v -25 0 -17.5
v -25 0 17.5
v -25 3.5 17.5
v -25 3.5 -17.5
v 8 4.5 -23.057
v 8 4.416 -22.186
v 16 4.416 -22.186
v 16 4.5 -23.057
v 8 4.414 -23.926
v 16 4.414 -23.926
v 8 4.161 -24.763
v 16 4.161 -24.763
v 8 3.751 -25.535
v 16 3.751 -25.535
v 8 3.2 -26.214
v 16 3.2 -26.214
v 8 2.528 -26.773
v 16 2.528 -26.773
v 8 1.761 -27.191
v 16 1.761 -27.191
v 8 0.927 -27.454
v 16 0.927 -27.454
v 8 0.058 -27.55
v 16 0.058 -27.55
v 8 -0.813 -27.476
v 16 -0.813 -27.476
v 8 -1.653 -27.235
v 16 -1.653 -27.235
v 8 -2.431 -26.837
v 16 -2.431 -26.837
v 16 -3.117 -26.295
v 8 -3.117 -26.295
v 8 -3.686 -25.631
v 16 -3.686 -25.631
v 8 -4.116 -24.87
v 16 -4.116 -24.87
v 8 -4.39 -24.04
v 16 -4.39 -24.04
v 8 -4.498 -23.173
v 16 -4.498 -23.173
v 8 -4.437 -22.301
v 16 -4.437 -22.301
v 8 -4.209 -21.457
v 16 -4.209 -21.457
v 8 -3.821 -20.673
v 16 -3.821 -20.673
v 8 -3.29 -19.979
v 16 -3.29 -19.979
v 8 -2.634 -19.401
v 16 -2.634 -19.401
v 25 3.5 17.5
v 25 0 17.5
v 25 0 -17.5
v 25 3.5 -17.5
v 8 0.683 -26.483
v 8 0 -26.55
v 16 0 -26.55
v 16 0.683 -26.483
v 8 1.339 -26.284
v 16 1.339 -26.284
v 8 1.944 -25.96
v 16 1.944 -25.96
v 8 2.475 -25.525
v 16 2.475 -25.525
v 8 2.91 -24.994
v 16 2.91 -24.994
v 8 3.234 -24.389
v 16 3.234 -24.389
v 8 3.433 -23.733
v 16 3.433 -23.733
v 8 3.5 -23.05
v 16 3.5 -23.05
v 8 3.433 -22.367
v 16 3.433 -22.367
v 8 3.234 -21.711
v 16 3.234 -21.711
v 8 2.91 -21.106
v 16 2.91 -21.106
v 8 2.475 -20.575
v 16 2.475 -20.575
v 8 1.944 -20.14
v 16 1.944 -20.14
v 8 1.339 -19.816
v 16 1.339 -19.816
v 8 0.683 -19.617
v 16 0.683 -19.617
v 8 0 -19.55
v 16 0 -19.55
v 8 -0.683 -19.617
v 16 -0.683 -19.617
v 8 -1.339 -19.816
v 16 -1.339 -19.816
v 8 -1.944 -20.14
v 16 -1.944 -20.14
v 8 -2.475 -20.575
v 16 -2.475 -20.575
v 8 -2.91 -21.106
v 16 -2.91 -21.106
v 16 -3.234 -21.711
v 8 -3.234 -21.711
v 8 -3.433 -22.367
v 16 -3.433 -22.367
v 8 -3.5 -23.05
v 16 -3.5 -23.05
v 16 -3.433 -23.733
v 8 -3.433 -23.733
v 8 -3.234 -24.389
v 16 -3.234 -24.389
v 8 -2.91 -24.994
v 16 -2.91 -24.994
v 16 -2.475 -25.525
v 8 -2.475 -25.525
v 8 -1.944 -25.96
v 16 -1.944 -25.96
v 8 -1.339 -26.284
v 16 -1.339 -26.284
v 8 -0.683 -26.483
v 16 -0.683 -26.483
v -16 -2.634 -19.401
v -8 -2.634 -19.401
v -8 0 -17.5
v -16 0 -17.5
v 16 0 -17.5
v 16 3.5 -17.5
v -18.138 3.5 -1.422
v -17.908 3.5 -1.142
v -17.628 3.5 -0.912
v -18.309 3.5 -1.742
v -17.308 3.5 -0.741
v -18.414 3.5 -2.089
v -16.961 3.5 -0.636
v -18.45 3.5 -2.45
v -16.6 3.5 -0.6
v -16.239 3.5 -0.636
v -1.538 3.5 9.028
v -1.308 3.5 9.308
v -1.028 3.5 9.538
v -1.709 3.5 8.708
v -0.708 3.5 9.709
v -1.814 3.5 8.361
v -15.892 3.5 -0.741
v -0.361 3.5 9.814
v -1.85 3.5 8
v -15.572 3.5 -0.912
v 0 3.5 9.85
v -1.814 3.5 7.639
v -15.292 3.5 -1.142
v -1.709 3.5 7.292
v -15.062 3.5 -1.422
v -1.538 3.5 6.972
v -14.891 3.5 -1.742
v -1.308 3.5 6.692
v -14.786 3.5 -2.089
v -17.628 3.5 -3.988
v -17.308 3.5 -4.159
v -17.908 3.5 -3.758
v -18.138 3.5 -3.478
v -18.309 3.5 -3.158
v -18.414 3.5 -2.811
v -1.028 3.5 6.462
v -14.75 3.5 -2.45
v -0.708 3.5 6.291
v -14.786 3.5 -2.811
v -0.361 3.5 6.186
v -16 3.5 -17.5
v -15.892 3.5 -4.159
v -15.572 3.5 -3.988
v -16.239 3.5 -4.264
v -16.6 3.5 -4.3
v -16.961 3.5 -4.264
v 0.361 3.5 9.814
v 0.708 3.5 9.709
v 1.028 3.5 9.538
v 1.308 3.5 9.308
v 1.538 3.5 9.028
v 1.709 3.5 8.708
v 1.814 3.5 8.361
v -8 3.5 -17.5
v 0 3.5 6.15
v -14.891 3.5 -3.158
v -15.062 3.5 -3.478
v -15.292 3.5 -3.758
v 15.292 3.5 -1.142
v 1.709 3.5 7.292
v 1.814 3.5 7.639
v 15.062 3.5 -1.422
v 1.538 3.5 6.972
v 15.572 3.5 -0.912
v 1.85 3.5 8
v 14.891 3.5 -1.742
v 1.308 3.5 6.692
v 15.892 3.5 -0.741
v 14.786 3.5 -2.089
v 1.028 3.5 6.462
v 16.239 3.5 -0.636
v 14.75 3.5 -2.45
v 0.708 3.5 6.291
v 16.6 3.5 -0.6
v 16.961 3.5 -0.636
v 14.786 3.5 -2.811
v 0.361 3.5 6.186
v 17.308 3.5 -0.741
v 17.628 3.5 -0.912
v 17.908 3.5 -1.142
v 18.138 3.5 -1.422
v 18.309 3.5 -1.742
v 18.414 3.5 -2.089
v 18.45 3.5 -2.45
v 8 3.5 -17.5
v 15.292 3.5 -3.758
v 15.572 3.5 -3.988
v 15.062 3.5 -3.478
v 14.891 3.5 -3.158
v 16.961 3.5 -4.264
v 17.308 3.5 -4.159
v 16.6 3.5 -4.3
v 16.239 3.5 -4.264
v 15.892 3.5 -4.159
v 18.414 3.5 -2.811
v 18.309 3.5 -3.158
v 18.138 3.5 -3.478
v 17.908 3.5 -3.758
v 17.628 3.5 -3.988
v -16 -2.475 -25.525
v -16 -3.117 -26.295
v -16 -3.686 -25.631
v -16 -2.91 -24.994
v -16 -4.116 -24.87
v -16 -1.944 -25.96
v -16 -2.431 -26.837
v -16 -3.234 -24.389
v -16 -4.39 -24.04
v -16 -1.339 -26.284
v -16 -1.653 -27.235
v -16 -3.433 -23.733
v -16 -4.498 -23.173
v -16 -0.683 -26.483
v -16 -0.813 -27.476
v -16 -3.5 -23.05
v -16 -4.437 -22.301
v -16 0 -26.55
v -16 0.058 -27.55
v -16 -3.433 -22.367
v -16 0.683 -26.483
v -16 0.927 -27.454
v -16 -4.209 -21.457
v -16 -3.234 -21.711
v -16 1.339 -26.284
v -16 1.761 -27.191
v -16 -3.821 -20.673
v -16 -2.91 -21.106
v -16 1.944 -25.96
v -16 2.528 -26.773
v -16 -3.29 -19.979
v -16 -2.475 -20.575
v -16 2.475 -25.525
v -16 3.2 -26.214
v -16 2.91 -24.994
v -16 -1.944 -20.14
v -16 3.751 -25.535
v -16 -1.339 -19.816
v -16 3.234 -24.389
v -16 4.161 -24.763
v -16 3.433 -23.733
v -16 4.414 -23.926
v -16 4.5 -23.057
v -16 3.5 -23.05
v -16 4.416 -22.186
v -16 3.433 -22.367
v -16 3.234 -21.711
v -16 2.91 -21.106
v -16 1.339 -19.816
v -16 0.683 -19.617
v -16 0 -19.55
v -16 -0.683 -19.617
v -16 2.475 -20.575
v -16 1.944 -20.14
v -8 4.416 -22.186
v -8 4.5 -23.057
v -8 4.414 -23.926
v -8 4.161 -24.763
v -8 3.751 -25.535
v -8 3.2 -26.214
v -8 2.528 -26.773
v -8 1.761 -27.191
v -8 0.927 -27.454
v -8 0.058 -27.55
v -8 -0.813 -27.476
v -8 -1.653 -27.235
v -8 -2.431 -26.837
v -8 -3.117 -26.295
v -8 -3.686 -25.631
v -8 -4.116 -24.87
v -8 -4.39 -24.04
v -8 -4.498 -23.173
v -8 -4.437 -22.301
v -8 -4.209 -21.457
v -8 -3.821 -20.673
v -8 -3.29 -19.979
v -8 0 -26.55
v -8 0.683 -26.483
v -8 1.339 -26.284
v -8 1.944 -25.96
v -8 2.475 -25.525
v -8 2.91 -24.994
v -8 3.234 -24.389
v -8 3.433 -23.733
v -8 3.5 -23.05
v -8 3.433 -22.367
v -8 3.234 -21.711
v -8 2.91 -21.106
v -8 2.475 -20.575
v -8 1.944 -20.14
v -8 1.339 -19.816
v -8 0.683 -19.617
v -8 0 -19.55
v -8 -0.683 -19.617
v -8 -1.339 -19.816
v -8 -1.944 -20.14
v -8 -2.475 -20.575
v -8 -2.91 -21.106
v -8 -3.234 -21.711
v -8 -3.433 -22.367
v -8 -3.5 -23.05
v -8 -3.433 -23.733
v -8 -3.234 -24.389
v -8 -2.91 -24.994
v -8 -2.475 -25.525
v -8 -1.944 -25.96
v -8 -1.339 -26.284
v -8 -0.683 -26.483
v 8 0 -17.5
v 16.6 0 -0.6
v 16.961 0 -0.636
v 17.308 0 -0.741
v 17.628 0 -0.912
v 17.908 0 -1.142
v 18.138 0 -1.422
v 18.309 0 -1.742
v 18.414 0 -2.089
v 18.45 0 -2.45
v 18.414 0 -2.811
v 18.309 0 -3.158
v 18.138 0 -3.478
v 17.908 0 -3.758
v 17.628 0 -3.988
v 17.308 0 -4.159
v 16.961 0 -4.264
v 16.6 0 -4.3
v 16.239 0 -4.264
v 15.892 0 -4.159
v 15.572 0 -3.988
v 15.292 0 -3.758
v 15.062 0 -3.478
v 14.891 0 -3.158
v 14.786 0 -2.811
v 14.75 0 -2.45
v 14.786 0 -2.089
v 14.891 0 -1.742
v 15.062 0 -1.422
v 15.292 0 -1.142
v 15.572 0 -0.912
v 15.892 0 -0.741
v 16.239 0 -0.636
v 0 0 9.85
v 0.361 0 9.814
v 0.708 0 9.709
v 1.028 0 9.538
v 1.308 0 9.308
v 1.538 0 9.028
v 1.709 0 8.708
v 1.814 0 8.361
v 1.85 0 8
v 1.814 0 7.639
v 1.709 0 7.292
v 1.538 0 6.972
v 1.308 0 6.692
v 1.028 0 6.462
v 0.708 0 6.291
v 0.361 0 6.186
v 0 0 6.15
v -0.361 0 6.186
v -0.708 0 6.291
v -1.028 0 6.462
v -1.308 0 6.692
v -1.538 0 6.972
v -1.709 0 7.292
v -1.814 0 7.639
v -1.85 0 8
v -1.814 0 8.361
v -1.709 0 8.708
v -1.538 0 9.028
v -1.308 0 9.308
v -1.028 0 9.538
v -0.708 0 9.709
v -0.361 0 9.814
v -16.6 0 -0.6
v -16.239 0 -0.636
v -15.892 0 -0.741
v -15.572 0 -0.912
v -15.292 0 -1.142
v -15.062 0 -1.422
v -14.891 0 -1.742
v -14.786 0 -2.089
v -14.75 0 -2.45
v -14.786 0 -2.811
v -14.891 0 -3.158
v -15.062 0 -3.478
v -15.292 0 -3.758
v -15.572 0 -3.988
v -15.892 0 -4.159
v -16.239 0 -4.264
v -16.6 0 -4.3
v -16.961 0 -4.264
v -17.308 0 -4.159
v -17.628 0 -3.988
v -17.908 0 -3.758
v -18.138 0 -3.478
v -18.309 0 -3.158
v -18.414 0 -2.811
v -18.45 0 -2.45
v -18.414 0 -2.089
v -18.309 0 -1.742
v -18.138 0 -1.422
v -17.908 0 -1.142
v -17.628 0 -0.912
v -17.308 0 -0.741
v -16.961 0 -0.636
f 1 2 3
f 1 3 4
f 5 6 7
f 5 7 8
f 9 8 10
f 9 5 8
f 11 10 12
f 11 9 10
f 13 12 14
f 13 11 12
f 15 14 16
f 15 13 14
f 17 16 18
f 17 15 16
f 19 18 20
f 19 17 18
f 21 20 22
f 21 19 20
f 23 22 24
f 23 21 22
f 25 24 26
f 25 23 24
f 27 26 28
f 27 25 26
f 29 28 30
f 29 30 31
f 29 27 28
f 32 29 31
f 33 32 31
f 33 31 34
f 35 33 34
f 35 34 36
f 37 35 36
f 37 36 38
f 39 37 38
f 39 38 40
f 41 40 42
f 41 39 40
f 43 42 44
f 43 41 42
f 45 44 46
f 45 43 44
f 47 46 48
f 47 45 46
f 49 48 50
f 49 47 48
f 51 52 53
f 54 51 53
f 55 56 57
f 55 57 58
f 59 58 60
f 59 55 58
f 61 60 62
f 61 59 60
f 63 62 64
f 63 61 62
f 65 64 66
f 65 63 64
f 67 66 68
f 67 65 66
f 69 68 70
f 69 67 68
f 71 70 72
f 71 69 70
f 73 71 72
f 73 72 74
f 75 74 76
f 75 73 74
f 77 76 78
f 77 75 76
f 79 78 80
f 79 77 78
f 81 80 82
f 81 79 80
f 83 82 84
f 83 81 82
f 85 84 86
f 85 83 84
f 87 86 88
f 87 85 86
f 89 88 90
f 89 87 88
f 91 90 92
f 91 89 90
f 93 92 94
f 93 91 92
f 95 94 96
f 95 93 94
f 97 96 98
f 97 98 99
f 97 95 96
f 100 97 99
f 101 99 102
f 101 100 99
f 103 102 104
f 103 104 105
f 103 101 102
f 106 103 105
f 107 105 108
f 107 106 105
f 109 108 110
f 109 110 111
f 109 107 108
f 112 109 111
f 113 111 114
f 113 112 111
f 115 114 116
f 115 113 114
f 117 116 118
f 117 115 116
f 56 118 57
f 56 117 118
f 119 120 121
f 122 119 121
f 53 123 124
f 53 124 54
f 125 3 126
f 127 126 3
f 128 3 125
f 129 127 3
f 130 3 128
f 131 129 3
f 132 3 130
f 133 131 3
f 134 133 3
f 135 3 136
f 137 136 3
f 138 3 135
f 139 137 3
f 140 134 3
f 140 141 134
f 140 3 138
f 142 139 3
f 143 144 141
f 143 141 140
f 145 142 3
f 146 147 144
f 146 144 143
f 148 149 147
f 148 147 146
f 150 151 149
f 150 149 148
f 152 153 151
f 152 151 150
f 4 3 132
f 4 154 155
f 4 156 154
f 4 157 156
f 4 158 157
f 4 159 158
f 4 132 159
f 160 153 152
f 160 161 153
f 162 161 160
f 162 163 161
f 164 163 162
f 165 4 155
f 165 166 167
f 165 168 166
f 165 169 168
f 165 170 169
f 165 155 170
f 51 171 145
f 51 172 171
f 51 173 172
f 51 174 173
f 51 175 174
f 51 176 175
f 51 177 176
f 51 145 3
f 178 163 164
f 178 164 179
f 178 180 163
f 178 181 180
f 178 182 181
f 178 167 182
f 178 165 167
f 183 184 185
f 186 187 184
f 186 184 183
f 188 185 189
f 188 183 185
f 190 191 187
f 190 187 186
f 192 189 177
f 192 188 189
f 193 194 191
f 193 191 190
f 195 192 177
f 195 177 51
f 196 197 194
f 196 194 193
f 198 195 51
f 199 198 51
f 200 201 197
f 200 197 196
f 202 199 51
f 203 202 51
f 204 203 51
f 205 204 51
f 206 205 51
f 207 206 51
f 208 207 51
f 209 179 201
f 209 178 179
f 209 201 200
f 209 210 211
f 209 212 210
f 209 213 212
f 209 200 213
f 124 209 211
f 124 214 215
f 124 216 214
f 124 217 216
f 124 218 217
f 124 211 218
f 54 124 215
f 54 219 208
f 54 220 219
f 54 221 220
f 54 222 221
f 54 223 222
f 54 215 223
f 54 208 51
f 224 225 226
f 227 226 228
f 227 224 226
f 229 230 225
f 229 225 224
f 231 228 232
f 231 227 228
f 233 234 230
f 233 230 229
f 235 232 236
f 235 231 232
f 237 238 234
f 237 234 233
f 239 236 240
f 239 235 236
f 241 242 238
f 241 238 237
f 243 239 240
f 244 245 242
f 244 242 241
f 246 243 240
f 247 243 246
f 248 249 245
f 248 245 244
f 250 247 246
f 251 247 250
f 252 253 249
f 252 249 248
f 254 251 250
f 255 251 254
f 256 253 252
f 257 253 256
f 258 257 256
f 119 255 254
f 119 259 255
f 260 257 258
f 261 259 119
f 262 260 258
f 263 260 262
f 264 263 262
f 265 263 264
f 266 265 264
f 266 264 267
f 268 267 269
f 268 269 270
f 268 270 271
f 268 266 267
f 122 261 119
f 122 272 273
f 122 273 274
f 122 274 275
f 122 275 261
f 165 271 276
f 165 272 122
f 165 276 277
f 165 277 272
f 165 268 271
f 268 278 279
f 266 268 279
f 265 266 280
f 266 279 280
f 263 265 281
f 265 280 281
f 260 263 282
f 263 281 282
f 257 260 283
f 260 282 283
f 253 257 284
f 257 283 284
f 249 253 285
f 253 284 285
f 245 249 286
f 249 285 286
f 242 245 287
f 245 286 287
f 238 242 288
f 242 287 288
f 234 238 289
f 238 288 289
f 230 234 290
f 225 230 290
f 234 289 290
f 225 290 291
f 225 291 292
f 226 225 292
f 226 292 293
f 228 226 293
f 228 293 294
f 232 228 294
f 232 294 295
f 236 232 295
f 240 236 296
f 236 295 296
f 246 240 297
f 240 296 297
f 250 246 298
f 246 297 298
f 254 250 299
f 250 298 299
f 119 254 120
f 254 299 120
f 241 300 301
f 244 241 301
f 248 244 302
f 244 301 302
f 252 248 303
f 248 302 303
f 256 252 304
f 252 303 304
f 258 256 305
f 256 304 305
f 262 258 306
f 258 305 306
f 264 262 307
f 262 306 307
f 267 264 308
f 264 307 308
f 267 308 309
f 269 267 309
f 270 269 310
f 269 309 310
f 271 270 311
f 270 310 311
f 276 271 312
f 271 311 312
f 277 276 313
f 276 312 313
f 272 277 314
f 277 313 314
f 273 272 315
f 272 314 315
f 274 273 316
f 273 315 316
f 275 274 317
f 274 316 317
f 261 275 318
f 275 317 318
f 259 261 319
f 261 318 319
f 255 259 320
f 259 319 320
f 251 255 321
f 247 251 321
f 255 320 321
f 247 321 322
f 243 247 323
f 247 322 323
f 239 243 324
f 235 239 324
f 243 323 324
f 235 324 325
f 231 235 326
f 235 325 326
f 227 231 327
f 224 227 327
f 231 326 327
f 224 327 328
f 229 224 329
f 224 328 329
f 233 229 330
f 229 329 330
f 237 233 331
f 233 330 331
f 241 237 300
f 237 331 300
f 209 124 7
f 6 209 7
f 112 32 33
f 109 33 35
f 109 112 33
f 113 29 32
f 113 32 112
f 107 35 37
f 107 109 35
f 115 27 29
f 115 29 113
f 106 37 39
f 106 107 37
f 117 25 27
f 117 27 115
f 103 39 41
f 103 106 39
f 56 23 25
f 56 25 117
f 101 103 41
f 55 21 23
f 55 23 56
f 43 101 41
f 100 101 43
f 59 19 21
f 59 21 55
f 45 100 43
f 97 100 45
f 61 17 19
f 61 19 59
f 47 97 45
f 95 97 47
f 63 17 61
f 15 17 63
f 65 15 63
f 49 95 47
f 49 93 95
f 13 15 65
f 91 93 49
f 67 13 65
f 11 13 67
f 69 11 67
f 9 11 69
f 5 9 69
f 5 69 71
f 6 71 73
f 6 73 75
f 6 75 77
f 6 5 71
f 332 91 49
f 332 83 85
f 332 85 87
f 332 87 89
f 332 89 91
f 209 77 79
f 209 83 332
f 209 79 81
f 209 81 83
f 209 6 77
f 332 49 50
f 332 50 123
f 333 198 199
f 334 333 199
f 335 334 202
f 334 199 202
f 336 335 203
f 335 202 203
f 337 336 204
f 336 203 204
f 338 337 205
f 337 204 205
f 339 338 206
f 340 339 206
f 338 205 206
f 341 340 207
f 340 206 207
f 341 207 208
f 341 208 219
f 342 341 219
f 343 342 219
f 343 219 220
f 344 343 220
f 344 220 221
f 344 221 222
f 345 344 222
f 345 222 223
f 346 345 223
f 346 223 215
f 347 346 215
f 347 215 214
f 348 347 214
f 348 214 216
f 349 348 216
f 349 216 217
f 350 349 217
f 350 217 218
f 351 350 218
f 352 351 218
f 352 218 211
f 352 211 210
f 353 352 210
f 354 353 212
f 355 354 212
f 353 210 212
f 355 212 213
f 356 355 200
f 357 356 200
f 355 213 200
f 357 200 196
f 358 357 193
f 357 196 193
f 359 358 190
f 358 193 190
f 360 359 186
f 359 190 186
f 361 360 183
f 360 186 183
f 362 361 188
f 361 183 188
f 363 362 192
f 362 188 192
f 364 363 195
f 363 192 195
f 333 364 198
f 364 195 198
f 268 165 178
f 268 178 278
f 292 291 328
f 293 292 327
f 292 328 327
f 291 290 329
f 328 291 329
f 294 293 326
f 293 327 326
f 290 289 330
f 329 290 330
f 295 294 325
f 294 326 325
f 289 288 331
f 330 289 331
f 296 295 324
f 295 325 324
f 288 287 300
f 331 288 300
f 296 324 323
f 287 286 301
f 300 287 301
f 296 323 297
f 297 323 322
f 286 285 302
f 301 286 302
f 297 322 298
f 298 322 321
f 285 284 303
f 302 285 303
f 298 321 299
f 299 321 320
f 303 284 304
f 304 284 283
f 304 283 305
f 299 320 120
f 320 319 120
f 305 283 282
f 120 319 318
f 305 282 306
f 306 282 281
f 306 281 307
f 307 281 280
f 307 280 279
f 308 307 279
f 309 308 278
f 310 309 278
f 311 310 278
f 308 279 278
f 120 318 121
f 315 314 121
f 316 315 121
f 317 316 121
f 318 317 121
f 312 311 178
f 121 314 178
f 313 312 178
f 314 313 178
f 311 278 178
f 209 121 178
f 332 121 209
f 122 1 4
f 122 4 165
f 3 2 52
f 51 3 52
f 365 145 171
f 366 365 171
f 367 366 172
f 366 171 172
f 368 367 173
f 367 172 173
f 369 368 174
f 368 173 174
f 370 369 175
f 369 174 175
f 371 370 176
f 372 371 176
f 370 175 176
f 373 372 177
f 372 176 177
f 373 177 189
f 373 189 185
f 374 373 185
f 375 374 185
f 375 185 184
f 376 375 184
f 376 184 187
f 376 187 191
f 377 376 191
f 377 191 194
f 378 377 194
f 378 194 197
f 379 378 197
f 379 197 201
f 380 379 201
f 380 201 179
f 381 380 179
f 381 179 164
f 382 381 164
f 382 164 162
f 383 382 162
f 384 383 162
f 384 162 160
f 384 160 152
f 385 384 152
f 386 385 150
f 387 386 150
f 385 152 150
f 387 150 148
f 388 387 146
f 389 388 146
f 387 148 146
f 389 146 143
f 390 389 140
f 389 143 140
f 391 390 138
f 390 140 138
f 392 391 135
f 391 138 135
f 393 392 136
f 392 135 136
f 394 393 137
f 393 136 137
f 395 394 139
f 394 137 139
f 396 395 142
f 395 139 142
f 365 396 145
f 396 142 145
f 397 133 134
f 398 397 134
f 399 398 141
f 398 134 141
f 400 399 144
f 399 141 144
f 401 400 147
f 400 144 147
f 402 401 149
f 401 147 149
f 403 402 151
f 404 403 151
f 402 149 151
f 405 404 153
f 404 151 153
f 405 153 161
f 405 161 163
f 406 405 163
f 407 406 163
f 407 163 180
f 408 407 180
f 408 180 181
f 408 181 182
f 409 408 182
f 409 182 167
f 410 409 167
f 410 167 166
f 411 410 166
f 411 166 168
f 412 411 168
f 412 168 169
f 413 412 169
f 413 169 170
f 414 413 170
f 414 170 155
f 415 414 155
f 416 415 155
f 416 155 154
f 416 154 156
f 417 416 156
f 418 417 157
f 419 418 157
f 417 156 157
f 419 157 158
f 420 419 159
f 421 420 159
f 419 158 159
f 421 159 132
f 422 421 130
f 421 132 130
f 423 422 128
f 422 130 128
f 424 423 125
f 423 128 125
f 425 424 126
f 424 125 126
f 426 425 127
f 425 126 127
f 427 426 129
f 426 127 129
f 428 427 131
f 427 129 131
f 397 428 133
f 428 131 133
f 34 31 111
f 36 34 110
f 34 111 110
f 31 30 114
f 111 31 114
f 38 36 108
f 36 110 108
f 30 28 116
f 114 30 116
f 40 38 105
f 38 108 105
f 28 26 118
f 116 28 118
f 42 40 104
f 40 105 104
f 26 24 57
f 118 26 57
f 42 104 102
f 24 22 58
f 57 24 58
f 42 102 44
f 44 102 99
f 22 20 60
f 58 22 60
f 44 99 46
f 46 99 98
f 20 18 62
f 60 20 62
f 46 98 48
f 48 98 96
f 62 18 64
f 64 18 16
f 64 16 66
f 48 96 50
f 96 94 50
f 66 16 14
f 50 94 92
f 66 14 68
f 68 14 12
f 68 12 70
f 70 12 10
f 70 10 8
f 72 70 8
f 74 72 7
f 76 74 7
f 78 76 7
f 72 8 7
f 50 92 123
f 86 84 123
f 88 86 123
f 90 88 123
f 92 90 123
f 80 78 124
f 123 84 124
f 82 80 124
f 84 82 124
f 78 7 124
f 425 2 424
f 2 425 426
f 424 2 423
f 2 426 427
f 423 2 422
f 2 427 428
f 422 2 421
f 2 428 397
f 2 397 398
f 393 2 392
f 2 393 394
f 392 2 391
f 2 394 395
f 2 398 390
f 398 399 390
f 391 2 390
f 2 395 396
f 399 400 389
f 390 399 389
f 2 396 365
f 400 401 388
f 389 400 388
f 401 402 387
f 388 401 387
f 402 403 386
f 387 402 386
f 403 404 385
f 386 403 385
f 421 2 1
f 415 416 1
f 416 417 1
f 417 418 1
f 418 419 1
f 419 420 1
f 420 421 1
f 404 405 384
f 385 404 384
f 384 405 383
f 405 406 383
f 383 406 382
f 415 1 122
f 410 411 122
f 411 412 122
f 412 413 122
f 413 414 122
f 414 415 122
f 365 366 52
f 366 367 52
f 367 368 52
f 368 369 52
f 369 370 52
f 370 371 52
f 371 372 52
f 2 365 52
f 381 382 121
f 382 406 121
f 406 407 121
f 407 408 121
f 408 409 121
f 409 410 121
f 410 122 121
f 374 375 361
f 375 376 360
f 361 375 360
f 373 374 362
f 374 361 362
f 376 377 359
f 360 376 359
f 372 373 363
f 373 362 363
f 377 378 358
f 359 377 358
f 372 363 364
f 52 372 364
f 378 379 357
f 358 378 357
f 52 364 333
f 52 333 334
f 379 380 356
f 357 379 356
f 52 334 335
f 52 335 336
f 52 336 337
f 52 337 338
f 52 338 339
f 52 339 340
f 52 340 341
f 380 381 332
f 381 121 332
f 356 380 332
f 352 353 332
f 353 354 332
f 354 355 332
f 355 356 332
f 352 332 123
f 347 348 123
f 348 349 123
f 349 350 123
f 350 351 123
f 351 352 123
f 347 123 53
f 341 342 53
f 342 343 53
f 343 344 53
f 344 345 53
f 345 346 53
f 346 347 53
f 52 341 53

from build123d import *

# Parameters (mm, degrees)
SKETCH2_W           = 50
SKETCH2_H           = 35
BOSS_EXTRUDE1_DEPTH = 3.5
SKETCH3_R           = 1.85
CUT_EXTRUDE1_DEPTH  = 31.716445107
SKETCH5_R           = 3.5
BOSS_EXTRUDE2_DEPTH = 8


with BuildPart() as part:
    # Sketch2 → Boss-Extrude1 (new body)
    with BuildSketch(Plane(origin=(0, 0, 0), x_dir=(1, 0, 0), z_dir=(0, 1, 0))):
        Rectangle(SKETCH2_W, SKETCH2_H)
    extrude(amount=BOSS_EXTRUDE1_DEPTH)

    # Sketch3 → Cut-Extrude1 (cut, through all)
    with BuildSketch(Plane(origin=(0, 3.5, 0), x_dir=(1, 0, 0), z_dir=(0, 1, 0))):
        with Locations(Location((-16.6, 2.45, 0), (0, 0, 270))):
            Circle(SKETCH3_R)
        with Locations(Location((0, -8, 0), (0, 0, 270))):
            Circle(SKETCH3_R)
        with Locations(Location((16.6, 2.45, 0), (0, 0, 270))):
            Circle(SKETCH3_R)
    extrude(amount=-CUT_EXTRUDE1_DEPTH, mode=Mode.SUBTRACT)

    # Sketch5 → Boss-Extrude2 (add)
    with BuildSketch(Plane(origin=(8, 0, 0), x_dir=(0, 0, -1), z_dir=(1, 0, 0))):
        with BuildLine():
            Line((17.5, 3.5), (22.186446019, 4.416364401))
            ThreePointArc((22.186446019, 4.416364401), (27.235272499, -1.653328191), (19.401351351, -2.633887439))
            Line((19.401351351, -2.633887439), (17.5, 0))
            Line((17.5, 0), (17.5, 3.5))
        make_face()
        with Locations((23.05, 0)):
            Circle(SKETCH5_R, mode=Mode.SUBTRACT)
    boss_extrude2 = extrude(amount=BOSS_EXTRUDE2_DEPTH)

    # Mirror1: Boss-Extrude2 across plane
    add(boss_extrude2.mirror(Plane(origin=(0, 0, 0), x_dir=(0, 0, 1), z_dir=(1, 0, 0))))


solid = part.part
